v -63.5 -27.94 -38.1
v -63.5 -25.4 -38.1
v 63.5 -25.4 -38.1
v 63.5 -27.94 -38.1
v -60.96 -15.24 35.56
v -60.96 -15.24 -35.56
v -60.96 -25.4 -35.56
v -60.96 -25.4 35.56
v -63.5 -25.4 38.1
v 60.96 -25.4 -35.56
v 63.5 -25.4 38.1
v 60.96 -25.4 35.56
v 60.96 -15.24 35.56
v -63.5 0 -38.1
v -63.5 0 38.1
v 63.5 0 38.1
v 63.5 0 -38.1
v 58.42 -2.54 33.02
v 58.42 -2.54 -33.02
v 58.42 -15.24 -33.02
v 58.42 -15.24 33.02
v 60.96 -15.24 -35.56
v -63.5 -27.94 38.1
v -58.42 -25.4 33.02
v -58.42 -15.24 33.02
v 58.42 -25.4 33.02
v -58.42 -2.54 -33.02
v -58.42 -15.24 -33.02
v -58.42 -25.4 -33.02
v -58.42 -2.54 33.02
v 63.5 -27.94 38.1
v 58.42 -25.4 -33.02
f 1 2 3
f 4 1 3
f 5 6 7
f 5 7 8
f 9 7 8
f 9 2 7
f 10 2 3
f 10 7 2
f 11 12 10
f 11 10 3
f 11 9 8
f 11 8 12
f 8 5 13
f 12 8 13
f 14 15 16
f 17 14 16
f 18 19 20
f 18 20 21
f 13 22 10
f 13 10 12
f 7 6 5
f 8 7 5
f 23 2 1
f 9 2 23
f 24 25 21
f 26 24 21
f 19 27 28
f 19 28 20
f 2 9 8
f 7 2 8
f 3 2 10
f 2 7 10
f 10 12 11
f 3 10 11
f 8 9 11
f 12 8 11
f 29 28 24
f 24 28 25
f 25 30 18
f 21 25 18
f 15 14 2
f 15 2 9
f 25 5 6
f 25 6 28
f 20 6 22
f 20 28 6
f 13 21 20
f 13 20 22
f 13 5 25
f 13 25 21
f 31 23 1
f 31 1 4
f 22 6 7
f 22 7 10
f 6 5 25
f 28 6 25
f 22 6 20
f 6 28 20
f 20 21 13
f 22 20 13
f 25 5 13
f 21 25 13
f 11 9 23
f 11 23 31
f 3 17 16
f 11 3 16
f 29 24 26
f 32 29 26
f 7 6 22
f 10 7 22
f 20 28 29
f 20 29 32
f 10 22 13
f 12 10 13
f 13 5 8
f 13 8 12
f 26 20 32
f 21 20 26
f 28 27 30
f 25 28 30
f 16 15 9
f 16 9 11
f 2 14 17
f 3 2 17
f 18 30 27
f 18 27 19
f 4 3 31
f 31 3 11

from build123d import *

# Parameters (mm, degrees)
F4_W     = 127
F4_H     = 76.2
F5_DEPTH = 25.4
F6_T     = -2.54
F0_W     = 121.92
F0_H     = 71.12
F0_W_2   = 116.84
F0_H_2   = 66.04
F1_DEPTH = 12.7
F2_DEPTH = 10.16
F3_W     = 127
F3_H     = 76.2
F7_DEPTH = 2.54


with BuildPart() as f5:
    # F4 (on Front) → F5 (new body)
    with BuildSketch(Plane.XZ):
        Rectangle(F4_W, F4_H)
    extrude(amount=F5_DEPTH)

    # F6
    f6_openings = [f5.faces().sort_by_distance(p)[0] for p in [
        (0, -25.4, 0),
    ]]
    offset(amount=F6_T, openings=f6_openings)

    # F0 (on face) → F1 (join)
    with BuildSketch(Plane.XZ.offset(2.54)):
        Rectangle(F0_W, F0_H)
        Rectangle(F0_W_2, F0_H_2, mode=Mode.SUBTRACT)
    extrude(amount=F1_DEPTH)


with BuildPart() as f2:
    # F2 (new): a face of the model
    f2_faces = [f5.part.faces().sort_by_distance(p)[0] for p in [
        (59.5485276907, -15.24, 0),
    ]]
    extrude(f2_faces, amount=F2_DEPTH)

    # F3 (on face) → F7 (join)
    with BuildSketch(Plane.XZ.offset(25.4)):
        Rectangle(F3_W, F3_H)
    extrude(amount=F7_DEPTH)


solid = Compound([f5.part, f2.part])
